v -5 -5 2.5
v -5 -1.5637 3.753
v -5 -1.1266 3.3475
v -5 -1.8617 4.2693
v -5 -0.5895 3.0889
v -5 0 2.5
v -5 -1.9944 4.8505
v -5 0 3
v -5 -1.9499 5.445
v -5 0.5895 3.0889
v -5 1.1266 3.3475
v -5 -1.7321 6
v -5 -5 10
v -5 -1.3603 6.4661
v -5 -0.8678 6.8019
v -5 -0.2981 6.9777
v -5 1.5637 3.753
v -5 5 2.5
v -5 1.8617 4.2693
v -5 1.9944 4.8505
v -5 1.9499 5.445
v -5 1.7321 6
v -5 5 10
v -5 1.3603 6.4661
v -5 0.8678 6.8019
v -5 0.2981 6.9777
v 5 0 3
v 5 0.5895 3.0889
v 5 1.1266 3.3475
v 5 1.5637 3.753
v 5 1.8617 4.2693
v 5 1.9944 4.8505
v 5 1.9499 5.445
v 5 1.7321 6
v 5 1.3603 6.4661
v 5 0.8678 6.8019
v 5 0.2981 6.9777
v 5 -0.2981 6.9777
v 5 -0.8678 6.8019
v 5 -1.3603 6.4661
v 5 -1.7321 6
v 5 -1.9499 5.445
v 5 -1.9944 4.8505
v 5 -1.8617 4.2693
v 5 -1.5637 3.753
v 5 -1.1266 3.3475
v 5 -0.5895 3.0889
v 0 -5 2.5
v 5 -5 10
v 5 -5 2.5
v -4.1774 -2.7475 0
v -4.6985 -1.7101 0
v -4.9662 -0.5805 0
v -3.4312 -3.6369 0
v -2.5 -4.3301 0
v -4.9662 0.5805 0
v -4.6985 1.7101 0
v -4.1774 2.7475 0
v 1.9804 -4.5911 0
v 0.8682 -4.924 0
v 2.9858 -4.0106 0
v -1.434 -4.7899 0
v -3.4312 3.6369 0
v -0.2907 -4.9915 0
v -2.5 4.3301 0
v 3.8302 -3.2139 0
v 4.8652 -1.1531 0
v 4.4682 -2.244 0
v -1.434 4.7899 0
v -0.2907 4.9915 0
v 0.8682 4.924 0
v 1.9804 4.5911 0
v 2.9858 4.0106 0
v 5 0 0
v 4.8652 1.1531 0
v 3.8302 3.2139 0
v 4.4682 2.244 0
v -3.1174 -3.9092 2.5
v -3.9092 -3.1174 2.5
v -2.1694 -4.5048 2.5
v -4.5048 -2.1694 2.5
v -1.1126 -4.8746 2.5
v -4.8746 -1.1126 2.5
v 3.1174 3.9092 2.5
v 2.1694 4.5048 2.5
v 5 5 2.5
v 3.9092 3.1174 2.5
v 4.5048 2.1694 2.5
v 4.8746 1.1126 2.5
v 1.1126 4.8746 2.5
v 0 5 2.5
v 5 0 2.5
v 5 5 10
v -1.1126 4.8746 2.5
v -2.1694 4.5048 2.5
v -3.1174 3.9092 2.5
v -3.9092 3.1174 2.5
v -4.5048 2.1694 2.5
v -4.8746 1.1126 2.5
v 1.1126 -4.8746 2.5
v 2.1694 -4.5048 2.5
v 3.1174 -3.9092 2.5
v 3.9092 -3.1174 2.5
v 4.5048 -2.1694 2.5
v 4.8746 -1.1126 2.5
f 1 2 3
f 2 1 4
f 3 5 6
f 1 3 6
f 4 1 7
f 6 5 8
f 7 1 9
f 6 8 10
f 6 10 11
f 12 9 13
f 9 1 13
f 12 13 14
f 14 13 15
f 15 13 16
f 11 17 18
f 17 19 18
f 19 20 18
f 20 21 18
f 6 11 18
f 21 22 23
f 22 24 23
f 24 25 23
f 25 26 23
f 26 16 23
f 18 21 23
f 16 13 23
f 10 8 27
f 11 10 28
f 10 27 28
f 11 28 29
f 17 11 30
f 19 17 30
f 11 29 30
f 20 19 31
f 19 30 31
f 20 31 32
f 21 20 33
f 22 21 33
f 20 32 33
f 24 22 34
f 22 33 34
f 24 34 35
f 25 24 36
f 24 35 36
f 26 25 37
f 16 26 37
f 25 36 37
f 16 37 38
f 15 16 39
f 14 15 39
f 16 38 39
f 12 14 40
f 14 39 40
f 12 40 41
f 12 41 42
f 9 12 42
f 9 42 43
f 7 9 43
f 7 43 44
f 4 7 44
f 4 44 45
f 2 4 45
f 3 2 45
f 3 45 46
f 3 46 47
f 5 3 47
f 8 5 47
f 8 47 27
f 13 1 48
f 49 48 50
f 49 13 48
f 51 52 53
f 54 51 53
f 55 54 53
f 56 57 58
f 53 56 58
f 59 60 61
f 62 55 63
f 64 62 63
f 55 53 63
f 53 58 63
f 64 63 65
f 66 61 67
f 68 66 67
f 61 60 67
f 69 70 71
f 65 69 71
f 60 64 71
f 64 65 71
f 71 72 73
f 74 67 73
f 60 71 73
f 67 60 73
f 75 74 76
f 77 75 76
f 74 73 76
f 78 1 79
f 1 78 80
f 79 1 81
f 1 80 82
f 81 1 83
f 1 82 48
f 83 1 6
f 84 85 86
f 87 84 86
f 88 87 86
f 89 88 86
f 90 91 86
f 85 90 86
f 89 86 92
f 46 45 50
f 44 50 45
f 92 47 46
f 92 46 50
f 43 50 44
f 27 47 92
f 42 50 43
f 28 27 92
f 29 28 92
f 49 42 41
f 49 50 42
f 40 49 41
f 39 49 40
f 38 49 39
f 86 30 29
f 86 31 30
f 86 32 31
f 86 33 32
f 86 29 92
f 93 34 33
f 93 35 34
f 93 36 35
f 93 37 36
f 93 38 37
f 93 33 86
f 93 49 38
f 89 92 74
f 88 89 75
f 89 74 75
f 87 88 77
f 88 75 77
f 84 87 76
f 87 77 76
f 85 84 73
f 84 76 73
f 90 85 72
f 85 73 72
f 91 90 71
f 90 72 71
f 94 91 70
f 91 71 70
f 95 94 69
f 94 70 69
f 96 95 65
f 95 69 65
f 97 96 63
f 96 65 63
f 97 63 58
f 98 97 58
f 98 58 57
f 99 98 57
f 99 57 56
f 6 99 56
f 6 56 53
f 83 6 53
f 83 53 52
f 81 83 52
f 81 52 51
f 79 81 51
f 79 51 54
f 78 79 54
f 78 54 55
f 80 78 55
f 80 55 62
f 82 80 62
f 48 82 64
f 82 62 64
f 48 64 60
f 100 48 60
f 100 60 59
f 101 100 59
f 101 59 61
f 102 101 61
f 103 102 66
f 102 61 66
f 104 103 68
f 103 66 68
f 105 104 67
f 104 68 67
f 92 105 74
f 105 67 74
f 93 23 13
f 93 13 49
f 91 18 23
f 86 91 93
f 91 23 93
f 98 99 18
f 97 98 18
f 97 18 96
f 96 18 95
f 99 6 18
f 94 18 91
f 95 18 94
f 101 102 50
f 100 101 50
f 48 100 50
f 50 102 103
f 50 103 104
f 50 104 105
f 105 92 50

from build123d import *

# Parameters (mm, degrees)
SKETCH1_R           = 5
BOSS_EXTRUDE1_DEPTH = 10
SKETCH3_W           = 10
SKETCH3_H           = 10
BOSS_EXTRUDE2_DEPTH = 7.5
SKETCH2_R           = 2
CUT_EXTRUDE1_DEPTH  = 11


with BuildPart() as part:
    # Sketch1 → Boss-Extrude1 (new body)
    with BuildSketch(Plane.XY):
        Circle(SKETCH1_R)
    extrude(amount=BOSS_EXTRUDE1_DEPTH)

    # Sketch3 → Boss-Extrude2 (add)
    with BuildSketch(Plane.XY.offset(10)):
        Rectangle(SKETCH3_W, SKETCH3_H)
    extrude(amount=-BOSS_EXTRUDE2_DEPTH)

    # Sketch2 → Cut-Extrude1 (cut, through all)
    with BuildSketch(Plane(origin=(5, 0, 0), x_dir=(0, 0, -1), z_dir=(1, 0, 0))):
        with Locations((-5, 0)):
            Circle(SKETCH2_R)
    extrude(amount=-CUT_EXTRUDE1_DEPTH, mode=Mode.SUBTRACT)


solid = part.part
